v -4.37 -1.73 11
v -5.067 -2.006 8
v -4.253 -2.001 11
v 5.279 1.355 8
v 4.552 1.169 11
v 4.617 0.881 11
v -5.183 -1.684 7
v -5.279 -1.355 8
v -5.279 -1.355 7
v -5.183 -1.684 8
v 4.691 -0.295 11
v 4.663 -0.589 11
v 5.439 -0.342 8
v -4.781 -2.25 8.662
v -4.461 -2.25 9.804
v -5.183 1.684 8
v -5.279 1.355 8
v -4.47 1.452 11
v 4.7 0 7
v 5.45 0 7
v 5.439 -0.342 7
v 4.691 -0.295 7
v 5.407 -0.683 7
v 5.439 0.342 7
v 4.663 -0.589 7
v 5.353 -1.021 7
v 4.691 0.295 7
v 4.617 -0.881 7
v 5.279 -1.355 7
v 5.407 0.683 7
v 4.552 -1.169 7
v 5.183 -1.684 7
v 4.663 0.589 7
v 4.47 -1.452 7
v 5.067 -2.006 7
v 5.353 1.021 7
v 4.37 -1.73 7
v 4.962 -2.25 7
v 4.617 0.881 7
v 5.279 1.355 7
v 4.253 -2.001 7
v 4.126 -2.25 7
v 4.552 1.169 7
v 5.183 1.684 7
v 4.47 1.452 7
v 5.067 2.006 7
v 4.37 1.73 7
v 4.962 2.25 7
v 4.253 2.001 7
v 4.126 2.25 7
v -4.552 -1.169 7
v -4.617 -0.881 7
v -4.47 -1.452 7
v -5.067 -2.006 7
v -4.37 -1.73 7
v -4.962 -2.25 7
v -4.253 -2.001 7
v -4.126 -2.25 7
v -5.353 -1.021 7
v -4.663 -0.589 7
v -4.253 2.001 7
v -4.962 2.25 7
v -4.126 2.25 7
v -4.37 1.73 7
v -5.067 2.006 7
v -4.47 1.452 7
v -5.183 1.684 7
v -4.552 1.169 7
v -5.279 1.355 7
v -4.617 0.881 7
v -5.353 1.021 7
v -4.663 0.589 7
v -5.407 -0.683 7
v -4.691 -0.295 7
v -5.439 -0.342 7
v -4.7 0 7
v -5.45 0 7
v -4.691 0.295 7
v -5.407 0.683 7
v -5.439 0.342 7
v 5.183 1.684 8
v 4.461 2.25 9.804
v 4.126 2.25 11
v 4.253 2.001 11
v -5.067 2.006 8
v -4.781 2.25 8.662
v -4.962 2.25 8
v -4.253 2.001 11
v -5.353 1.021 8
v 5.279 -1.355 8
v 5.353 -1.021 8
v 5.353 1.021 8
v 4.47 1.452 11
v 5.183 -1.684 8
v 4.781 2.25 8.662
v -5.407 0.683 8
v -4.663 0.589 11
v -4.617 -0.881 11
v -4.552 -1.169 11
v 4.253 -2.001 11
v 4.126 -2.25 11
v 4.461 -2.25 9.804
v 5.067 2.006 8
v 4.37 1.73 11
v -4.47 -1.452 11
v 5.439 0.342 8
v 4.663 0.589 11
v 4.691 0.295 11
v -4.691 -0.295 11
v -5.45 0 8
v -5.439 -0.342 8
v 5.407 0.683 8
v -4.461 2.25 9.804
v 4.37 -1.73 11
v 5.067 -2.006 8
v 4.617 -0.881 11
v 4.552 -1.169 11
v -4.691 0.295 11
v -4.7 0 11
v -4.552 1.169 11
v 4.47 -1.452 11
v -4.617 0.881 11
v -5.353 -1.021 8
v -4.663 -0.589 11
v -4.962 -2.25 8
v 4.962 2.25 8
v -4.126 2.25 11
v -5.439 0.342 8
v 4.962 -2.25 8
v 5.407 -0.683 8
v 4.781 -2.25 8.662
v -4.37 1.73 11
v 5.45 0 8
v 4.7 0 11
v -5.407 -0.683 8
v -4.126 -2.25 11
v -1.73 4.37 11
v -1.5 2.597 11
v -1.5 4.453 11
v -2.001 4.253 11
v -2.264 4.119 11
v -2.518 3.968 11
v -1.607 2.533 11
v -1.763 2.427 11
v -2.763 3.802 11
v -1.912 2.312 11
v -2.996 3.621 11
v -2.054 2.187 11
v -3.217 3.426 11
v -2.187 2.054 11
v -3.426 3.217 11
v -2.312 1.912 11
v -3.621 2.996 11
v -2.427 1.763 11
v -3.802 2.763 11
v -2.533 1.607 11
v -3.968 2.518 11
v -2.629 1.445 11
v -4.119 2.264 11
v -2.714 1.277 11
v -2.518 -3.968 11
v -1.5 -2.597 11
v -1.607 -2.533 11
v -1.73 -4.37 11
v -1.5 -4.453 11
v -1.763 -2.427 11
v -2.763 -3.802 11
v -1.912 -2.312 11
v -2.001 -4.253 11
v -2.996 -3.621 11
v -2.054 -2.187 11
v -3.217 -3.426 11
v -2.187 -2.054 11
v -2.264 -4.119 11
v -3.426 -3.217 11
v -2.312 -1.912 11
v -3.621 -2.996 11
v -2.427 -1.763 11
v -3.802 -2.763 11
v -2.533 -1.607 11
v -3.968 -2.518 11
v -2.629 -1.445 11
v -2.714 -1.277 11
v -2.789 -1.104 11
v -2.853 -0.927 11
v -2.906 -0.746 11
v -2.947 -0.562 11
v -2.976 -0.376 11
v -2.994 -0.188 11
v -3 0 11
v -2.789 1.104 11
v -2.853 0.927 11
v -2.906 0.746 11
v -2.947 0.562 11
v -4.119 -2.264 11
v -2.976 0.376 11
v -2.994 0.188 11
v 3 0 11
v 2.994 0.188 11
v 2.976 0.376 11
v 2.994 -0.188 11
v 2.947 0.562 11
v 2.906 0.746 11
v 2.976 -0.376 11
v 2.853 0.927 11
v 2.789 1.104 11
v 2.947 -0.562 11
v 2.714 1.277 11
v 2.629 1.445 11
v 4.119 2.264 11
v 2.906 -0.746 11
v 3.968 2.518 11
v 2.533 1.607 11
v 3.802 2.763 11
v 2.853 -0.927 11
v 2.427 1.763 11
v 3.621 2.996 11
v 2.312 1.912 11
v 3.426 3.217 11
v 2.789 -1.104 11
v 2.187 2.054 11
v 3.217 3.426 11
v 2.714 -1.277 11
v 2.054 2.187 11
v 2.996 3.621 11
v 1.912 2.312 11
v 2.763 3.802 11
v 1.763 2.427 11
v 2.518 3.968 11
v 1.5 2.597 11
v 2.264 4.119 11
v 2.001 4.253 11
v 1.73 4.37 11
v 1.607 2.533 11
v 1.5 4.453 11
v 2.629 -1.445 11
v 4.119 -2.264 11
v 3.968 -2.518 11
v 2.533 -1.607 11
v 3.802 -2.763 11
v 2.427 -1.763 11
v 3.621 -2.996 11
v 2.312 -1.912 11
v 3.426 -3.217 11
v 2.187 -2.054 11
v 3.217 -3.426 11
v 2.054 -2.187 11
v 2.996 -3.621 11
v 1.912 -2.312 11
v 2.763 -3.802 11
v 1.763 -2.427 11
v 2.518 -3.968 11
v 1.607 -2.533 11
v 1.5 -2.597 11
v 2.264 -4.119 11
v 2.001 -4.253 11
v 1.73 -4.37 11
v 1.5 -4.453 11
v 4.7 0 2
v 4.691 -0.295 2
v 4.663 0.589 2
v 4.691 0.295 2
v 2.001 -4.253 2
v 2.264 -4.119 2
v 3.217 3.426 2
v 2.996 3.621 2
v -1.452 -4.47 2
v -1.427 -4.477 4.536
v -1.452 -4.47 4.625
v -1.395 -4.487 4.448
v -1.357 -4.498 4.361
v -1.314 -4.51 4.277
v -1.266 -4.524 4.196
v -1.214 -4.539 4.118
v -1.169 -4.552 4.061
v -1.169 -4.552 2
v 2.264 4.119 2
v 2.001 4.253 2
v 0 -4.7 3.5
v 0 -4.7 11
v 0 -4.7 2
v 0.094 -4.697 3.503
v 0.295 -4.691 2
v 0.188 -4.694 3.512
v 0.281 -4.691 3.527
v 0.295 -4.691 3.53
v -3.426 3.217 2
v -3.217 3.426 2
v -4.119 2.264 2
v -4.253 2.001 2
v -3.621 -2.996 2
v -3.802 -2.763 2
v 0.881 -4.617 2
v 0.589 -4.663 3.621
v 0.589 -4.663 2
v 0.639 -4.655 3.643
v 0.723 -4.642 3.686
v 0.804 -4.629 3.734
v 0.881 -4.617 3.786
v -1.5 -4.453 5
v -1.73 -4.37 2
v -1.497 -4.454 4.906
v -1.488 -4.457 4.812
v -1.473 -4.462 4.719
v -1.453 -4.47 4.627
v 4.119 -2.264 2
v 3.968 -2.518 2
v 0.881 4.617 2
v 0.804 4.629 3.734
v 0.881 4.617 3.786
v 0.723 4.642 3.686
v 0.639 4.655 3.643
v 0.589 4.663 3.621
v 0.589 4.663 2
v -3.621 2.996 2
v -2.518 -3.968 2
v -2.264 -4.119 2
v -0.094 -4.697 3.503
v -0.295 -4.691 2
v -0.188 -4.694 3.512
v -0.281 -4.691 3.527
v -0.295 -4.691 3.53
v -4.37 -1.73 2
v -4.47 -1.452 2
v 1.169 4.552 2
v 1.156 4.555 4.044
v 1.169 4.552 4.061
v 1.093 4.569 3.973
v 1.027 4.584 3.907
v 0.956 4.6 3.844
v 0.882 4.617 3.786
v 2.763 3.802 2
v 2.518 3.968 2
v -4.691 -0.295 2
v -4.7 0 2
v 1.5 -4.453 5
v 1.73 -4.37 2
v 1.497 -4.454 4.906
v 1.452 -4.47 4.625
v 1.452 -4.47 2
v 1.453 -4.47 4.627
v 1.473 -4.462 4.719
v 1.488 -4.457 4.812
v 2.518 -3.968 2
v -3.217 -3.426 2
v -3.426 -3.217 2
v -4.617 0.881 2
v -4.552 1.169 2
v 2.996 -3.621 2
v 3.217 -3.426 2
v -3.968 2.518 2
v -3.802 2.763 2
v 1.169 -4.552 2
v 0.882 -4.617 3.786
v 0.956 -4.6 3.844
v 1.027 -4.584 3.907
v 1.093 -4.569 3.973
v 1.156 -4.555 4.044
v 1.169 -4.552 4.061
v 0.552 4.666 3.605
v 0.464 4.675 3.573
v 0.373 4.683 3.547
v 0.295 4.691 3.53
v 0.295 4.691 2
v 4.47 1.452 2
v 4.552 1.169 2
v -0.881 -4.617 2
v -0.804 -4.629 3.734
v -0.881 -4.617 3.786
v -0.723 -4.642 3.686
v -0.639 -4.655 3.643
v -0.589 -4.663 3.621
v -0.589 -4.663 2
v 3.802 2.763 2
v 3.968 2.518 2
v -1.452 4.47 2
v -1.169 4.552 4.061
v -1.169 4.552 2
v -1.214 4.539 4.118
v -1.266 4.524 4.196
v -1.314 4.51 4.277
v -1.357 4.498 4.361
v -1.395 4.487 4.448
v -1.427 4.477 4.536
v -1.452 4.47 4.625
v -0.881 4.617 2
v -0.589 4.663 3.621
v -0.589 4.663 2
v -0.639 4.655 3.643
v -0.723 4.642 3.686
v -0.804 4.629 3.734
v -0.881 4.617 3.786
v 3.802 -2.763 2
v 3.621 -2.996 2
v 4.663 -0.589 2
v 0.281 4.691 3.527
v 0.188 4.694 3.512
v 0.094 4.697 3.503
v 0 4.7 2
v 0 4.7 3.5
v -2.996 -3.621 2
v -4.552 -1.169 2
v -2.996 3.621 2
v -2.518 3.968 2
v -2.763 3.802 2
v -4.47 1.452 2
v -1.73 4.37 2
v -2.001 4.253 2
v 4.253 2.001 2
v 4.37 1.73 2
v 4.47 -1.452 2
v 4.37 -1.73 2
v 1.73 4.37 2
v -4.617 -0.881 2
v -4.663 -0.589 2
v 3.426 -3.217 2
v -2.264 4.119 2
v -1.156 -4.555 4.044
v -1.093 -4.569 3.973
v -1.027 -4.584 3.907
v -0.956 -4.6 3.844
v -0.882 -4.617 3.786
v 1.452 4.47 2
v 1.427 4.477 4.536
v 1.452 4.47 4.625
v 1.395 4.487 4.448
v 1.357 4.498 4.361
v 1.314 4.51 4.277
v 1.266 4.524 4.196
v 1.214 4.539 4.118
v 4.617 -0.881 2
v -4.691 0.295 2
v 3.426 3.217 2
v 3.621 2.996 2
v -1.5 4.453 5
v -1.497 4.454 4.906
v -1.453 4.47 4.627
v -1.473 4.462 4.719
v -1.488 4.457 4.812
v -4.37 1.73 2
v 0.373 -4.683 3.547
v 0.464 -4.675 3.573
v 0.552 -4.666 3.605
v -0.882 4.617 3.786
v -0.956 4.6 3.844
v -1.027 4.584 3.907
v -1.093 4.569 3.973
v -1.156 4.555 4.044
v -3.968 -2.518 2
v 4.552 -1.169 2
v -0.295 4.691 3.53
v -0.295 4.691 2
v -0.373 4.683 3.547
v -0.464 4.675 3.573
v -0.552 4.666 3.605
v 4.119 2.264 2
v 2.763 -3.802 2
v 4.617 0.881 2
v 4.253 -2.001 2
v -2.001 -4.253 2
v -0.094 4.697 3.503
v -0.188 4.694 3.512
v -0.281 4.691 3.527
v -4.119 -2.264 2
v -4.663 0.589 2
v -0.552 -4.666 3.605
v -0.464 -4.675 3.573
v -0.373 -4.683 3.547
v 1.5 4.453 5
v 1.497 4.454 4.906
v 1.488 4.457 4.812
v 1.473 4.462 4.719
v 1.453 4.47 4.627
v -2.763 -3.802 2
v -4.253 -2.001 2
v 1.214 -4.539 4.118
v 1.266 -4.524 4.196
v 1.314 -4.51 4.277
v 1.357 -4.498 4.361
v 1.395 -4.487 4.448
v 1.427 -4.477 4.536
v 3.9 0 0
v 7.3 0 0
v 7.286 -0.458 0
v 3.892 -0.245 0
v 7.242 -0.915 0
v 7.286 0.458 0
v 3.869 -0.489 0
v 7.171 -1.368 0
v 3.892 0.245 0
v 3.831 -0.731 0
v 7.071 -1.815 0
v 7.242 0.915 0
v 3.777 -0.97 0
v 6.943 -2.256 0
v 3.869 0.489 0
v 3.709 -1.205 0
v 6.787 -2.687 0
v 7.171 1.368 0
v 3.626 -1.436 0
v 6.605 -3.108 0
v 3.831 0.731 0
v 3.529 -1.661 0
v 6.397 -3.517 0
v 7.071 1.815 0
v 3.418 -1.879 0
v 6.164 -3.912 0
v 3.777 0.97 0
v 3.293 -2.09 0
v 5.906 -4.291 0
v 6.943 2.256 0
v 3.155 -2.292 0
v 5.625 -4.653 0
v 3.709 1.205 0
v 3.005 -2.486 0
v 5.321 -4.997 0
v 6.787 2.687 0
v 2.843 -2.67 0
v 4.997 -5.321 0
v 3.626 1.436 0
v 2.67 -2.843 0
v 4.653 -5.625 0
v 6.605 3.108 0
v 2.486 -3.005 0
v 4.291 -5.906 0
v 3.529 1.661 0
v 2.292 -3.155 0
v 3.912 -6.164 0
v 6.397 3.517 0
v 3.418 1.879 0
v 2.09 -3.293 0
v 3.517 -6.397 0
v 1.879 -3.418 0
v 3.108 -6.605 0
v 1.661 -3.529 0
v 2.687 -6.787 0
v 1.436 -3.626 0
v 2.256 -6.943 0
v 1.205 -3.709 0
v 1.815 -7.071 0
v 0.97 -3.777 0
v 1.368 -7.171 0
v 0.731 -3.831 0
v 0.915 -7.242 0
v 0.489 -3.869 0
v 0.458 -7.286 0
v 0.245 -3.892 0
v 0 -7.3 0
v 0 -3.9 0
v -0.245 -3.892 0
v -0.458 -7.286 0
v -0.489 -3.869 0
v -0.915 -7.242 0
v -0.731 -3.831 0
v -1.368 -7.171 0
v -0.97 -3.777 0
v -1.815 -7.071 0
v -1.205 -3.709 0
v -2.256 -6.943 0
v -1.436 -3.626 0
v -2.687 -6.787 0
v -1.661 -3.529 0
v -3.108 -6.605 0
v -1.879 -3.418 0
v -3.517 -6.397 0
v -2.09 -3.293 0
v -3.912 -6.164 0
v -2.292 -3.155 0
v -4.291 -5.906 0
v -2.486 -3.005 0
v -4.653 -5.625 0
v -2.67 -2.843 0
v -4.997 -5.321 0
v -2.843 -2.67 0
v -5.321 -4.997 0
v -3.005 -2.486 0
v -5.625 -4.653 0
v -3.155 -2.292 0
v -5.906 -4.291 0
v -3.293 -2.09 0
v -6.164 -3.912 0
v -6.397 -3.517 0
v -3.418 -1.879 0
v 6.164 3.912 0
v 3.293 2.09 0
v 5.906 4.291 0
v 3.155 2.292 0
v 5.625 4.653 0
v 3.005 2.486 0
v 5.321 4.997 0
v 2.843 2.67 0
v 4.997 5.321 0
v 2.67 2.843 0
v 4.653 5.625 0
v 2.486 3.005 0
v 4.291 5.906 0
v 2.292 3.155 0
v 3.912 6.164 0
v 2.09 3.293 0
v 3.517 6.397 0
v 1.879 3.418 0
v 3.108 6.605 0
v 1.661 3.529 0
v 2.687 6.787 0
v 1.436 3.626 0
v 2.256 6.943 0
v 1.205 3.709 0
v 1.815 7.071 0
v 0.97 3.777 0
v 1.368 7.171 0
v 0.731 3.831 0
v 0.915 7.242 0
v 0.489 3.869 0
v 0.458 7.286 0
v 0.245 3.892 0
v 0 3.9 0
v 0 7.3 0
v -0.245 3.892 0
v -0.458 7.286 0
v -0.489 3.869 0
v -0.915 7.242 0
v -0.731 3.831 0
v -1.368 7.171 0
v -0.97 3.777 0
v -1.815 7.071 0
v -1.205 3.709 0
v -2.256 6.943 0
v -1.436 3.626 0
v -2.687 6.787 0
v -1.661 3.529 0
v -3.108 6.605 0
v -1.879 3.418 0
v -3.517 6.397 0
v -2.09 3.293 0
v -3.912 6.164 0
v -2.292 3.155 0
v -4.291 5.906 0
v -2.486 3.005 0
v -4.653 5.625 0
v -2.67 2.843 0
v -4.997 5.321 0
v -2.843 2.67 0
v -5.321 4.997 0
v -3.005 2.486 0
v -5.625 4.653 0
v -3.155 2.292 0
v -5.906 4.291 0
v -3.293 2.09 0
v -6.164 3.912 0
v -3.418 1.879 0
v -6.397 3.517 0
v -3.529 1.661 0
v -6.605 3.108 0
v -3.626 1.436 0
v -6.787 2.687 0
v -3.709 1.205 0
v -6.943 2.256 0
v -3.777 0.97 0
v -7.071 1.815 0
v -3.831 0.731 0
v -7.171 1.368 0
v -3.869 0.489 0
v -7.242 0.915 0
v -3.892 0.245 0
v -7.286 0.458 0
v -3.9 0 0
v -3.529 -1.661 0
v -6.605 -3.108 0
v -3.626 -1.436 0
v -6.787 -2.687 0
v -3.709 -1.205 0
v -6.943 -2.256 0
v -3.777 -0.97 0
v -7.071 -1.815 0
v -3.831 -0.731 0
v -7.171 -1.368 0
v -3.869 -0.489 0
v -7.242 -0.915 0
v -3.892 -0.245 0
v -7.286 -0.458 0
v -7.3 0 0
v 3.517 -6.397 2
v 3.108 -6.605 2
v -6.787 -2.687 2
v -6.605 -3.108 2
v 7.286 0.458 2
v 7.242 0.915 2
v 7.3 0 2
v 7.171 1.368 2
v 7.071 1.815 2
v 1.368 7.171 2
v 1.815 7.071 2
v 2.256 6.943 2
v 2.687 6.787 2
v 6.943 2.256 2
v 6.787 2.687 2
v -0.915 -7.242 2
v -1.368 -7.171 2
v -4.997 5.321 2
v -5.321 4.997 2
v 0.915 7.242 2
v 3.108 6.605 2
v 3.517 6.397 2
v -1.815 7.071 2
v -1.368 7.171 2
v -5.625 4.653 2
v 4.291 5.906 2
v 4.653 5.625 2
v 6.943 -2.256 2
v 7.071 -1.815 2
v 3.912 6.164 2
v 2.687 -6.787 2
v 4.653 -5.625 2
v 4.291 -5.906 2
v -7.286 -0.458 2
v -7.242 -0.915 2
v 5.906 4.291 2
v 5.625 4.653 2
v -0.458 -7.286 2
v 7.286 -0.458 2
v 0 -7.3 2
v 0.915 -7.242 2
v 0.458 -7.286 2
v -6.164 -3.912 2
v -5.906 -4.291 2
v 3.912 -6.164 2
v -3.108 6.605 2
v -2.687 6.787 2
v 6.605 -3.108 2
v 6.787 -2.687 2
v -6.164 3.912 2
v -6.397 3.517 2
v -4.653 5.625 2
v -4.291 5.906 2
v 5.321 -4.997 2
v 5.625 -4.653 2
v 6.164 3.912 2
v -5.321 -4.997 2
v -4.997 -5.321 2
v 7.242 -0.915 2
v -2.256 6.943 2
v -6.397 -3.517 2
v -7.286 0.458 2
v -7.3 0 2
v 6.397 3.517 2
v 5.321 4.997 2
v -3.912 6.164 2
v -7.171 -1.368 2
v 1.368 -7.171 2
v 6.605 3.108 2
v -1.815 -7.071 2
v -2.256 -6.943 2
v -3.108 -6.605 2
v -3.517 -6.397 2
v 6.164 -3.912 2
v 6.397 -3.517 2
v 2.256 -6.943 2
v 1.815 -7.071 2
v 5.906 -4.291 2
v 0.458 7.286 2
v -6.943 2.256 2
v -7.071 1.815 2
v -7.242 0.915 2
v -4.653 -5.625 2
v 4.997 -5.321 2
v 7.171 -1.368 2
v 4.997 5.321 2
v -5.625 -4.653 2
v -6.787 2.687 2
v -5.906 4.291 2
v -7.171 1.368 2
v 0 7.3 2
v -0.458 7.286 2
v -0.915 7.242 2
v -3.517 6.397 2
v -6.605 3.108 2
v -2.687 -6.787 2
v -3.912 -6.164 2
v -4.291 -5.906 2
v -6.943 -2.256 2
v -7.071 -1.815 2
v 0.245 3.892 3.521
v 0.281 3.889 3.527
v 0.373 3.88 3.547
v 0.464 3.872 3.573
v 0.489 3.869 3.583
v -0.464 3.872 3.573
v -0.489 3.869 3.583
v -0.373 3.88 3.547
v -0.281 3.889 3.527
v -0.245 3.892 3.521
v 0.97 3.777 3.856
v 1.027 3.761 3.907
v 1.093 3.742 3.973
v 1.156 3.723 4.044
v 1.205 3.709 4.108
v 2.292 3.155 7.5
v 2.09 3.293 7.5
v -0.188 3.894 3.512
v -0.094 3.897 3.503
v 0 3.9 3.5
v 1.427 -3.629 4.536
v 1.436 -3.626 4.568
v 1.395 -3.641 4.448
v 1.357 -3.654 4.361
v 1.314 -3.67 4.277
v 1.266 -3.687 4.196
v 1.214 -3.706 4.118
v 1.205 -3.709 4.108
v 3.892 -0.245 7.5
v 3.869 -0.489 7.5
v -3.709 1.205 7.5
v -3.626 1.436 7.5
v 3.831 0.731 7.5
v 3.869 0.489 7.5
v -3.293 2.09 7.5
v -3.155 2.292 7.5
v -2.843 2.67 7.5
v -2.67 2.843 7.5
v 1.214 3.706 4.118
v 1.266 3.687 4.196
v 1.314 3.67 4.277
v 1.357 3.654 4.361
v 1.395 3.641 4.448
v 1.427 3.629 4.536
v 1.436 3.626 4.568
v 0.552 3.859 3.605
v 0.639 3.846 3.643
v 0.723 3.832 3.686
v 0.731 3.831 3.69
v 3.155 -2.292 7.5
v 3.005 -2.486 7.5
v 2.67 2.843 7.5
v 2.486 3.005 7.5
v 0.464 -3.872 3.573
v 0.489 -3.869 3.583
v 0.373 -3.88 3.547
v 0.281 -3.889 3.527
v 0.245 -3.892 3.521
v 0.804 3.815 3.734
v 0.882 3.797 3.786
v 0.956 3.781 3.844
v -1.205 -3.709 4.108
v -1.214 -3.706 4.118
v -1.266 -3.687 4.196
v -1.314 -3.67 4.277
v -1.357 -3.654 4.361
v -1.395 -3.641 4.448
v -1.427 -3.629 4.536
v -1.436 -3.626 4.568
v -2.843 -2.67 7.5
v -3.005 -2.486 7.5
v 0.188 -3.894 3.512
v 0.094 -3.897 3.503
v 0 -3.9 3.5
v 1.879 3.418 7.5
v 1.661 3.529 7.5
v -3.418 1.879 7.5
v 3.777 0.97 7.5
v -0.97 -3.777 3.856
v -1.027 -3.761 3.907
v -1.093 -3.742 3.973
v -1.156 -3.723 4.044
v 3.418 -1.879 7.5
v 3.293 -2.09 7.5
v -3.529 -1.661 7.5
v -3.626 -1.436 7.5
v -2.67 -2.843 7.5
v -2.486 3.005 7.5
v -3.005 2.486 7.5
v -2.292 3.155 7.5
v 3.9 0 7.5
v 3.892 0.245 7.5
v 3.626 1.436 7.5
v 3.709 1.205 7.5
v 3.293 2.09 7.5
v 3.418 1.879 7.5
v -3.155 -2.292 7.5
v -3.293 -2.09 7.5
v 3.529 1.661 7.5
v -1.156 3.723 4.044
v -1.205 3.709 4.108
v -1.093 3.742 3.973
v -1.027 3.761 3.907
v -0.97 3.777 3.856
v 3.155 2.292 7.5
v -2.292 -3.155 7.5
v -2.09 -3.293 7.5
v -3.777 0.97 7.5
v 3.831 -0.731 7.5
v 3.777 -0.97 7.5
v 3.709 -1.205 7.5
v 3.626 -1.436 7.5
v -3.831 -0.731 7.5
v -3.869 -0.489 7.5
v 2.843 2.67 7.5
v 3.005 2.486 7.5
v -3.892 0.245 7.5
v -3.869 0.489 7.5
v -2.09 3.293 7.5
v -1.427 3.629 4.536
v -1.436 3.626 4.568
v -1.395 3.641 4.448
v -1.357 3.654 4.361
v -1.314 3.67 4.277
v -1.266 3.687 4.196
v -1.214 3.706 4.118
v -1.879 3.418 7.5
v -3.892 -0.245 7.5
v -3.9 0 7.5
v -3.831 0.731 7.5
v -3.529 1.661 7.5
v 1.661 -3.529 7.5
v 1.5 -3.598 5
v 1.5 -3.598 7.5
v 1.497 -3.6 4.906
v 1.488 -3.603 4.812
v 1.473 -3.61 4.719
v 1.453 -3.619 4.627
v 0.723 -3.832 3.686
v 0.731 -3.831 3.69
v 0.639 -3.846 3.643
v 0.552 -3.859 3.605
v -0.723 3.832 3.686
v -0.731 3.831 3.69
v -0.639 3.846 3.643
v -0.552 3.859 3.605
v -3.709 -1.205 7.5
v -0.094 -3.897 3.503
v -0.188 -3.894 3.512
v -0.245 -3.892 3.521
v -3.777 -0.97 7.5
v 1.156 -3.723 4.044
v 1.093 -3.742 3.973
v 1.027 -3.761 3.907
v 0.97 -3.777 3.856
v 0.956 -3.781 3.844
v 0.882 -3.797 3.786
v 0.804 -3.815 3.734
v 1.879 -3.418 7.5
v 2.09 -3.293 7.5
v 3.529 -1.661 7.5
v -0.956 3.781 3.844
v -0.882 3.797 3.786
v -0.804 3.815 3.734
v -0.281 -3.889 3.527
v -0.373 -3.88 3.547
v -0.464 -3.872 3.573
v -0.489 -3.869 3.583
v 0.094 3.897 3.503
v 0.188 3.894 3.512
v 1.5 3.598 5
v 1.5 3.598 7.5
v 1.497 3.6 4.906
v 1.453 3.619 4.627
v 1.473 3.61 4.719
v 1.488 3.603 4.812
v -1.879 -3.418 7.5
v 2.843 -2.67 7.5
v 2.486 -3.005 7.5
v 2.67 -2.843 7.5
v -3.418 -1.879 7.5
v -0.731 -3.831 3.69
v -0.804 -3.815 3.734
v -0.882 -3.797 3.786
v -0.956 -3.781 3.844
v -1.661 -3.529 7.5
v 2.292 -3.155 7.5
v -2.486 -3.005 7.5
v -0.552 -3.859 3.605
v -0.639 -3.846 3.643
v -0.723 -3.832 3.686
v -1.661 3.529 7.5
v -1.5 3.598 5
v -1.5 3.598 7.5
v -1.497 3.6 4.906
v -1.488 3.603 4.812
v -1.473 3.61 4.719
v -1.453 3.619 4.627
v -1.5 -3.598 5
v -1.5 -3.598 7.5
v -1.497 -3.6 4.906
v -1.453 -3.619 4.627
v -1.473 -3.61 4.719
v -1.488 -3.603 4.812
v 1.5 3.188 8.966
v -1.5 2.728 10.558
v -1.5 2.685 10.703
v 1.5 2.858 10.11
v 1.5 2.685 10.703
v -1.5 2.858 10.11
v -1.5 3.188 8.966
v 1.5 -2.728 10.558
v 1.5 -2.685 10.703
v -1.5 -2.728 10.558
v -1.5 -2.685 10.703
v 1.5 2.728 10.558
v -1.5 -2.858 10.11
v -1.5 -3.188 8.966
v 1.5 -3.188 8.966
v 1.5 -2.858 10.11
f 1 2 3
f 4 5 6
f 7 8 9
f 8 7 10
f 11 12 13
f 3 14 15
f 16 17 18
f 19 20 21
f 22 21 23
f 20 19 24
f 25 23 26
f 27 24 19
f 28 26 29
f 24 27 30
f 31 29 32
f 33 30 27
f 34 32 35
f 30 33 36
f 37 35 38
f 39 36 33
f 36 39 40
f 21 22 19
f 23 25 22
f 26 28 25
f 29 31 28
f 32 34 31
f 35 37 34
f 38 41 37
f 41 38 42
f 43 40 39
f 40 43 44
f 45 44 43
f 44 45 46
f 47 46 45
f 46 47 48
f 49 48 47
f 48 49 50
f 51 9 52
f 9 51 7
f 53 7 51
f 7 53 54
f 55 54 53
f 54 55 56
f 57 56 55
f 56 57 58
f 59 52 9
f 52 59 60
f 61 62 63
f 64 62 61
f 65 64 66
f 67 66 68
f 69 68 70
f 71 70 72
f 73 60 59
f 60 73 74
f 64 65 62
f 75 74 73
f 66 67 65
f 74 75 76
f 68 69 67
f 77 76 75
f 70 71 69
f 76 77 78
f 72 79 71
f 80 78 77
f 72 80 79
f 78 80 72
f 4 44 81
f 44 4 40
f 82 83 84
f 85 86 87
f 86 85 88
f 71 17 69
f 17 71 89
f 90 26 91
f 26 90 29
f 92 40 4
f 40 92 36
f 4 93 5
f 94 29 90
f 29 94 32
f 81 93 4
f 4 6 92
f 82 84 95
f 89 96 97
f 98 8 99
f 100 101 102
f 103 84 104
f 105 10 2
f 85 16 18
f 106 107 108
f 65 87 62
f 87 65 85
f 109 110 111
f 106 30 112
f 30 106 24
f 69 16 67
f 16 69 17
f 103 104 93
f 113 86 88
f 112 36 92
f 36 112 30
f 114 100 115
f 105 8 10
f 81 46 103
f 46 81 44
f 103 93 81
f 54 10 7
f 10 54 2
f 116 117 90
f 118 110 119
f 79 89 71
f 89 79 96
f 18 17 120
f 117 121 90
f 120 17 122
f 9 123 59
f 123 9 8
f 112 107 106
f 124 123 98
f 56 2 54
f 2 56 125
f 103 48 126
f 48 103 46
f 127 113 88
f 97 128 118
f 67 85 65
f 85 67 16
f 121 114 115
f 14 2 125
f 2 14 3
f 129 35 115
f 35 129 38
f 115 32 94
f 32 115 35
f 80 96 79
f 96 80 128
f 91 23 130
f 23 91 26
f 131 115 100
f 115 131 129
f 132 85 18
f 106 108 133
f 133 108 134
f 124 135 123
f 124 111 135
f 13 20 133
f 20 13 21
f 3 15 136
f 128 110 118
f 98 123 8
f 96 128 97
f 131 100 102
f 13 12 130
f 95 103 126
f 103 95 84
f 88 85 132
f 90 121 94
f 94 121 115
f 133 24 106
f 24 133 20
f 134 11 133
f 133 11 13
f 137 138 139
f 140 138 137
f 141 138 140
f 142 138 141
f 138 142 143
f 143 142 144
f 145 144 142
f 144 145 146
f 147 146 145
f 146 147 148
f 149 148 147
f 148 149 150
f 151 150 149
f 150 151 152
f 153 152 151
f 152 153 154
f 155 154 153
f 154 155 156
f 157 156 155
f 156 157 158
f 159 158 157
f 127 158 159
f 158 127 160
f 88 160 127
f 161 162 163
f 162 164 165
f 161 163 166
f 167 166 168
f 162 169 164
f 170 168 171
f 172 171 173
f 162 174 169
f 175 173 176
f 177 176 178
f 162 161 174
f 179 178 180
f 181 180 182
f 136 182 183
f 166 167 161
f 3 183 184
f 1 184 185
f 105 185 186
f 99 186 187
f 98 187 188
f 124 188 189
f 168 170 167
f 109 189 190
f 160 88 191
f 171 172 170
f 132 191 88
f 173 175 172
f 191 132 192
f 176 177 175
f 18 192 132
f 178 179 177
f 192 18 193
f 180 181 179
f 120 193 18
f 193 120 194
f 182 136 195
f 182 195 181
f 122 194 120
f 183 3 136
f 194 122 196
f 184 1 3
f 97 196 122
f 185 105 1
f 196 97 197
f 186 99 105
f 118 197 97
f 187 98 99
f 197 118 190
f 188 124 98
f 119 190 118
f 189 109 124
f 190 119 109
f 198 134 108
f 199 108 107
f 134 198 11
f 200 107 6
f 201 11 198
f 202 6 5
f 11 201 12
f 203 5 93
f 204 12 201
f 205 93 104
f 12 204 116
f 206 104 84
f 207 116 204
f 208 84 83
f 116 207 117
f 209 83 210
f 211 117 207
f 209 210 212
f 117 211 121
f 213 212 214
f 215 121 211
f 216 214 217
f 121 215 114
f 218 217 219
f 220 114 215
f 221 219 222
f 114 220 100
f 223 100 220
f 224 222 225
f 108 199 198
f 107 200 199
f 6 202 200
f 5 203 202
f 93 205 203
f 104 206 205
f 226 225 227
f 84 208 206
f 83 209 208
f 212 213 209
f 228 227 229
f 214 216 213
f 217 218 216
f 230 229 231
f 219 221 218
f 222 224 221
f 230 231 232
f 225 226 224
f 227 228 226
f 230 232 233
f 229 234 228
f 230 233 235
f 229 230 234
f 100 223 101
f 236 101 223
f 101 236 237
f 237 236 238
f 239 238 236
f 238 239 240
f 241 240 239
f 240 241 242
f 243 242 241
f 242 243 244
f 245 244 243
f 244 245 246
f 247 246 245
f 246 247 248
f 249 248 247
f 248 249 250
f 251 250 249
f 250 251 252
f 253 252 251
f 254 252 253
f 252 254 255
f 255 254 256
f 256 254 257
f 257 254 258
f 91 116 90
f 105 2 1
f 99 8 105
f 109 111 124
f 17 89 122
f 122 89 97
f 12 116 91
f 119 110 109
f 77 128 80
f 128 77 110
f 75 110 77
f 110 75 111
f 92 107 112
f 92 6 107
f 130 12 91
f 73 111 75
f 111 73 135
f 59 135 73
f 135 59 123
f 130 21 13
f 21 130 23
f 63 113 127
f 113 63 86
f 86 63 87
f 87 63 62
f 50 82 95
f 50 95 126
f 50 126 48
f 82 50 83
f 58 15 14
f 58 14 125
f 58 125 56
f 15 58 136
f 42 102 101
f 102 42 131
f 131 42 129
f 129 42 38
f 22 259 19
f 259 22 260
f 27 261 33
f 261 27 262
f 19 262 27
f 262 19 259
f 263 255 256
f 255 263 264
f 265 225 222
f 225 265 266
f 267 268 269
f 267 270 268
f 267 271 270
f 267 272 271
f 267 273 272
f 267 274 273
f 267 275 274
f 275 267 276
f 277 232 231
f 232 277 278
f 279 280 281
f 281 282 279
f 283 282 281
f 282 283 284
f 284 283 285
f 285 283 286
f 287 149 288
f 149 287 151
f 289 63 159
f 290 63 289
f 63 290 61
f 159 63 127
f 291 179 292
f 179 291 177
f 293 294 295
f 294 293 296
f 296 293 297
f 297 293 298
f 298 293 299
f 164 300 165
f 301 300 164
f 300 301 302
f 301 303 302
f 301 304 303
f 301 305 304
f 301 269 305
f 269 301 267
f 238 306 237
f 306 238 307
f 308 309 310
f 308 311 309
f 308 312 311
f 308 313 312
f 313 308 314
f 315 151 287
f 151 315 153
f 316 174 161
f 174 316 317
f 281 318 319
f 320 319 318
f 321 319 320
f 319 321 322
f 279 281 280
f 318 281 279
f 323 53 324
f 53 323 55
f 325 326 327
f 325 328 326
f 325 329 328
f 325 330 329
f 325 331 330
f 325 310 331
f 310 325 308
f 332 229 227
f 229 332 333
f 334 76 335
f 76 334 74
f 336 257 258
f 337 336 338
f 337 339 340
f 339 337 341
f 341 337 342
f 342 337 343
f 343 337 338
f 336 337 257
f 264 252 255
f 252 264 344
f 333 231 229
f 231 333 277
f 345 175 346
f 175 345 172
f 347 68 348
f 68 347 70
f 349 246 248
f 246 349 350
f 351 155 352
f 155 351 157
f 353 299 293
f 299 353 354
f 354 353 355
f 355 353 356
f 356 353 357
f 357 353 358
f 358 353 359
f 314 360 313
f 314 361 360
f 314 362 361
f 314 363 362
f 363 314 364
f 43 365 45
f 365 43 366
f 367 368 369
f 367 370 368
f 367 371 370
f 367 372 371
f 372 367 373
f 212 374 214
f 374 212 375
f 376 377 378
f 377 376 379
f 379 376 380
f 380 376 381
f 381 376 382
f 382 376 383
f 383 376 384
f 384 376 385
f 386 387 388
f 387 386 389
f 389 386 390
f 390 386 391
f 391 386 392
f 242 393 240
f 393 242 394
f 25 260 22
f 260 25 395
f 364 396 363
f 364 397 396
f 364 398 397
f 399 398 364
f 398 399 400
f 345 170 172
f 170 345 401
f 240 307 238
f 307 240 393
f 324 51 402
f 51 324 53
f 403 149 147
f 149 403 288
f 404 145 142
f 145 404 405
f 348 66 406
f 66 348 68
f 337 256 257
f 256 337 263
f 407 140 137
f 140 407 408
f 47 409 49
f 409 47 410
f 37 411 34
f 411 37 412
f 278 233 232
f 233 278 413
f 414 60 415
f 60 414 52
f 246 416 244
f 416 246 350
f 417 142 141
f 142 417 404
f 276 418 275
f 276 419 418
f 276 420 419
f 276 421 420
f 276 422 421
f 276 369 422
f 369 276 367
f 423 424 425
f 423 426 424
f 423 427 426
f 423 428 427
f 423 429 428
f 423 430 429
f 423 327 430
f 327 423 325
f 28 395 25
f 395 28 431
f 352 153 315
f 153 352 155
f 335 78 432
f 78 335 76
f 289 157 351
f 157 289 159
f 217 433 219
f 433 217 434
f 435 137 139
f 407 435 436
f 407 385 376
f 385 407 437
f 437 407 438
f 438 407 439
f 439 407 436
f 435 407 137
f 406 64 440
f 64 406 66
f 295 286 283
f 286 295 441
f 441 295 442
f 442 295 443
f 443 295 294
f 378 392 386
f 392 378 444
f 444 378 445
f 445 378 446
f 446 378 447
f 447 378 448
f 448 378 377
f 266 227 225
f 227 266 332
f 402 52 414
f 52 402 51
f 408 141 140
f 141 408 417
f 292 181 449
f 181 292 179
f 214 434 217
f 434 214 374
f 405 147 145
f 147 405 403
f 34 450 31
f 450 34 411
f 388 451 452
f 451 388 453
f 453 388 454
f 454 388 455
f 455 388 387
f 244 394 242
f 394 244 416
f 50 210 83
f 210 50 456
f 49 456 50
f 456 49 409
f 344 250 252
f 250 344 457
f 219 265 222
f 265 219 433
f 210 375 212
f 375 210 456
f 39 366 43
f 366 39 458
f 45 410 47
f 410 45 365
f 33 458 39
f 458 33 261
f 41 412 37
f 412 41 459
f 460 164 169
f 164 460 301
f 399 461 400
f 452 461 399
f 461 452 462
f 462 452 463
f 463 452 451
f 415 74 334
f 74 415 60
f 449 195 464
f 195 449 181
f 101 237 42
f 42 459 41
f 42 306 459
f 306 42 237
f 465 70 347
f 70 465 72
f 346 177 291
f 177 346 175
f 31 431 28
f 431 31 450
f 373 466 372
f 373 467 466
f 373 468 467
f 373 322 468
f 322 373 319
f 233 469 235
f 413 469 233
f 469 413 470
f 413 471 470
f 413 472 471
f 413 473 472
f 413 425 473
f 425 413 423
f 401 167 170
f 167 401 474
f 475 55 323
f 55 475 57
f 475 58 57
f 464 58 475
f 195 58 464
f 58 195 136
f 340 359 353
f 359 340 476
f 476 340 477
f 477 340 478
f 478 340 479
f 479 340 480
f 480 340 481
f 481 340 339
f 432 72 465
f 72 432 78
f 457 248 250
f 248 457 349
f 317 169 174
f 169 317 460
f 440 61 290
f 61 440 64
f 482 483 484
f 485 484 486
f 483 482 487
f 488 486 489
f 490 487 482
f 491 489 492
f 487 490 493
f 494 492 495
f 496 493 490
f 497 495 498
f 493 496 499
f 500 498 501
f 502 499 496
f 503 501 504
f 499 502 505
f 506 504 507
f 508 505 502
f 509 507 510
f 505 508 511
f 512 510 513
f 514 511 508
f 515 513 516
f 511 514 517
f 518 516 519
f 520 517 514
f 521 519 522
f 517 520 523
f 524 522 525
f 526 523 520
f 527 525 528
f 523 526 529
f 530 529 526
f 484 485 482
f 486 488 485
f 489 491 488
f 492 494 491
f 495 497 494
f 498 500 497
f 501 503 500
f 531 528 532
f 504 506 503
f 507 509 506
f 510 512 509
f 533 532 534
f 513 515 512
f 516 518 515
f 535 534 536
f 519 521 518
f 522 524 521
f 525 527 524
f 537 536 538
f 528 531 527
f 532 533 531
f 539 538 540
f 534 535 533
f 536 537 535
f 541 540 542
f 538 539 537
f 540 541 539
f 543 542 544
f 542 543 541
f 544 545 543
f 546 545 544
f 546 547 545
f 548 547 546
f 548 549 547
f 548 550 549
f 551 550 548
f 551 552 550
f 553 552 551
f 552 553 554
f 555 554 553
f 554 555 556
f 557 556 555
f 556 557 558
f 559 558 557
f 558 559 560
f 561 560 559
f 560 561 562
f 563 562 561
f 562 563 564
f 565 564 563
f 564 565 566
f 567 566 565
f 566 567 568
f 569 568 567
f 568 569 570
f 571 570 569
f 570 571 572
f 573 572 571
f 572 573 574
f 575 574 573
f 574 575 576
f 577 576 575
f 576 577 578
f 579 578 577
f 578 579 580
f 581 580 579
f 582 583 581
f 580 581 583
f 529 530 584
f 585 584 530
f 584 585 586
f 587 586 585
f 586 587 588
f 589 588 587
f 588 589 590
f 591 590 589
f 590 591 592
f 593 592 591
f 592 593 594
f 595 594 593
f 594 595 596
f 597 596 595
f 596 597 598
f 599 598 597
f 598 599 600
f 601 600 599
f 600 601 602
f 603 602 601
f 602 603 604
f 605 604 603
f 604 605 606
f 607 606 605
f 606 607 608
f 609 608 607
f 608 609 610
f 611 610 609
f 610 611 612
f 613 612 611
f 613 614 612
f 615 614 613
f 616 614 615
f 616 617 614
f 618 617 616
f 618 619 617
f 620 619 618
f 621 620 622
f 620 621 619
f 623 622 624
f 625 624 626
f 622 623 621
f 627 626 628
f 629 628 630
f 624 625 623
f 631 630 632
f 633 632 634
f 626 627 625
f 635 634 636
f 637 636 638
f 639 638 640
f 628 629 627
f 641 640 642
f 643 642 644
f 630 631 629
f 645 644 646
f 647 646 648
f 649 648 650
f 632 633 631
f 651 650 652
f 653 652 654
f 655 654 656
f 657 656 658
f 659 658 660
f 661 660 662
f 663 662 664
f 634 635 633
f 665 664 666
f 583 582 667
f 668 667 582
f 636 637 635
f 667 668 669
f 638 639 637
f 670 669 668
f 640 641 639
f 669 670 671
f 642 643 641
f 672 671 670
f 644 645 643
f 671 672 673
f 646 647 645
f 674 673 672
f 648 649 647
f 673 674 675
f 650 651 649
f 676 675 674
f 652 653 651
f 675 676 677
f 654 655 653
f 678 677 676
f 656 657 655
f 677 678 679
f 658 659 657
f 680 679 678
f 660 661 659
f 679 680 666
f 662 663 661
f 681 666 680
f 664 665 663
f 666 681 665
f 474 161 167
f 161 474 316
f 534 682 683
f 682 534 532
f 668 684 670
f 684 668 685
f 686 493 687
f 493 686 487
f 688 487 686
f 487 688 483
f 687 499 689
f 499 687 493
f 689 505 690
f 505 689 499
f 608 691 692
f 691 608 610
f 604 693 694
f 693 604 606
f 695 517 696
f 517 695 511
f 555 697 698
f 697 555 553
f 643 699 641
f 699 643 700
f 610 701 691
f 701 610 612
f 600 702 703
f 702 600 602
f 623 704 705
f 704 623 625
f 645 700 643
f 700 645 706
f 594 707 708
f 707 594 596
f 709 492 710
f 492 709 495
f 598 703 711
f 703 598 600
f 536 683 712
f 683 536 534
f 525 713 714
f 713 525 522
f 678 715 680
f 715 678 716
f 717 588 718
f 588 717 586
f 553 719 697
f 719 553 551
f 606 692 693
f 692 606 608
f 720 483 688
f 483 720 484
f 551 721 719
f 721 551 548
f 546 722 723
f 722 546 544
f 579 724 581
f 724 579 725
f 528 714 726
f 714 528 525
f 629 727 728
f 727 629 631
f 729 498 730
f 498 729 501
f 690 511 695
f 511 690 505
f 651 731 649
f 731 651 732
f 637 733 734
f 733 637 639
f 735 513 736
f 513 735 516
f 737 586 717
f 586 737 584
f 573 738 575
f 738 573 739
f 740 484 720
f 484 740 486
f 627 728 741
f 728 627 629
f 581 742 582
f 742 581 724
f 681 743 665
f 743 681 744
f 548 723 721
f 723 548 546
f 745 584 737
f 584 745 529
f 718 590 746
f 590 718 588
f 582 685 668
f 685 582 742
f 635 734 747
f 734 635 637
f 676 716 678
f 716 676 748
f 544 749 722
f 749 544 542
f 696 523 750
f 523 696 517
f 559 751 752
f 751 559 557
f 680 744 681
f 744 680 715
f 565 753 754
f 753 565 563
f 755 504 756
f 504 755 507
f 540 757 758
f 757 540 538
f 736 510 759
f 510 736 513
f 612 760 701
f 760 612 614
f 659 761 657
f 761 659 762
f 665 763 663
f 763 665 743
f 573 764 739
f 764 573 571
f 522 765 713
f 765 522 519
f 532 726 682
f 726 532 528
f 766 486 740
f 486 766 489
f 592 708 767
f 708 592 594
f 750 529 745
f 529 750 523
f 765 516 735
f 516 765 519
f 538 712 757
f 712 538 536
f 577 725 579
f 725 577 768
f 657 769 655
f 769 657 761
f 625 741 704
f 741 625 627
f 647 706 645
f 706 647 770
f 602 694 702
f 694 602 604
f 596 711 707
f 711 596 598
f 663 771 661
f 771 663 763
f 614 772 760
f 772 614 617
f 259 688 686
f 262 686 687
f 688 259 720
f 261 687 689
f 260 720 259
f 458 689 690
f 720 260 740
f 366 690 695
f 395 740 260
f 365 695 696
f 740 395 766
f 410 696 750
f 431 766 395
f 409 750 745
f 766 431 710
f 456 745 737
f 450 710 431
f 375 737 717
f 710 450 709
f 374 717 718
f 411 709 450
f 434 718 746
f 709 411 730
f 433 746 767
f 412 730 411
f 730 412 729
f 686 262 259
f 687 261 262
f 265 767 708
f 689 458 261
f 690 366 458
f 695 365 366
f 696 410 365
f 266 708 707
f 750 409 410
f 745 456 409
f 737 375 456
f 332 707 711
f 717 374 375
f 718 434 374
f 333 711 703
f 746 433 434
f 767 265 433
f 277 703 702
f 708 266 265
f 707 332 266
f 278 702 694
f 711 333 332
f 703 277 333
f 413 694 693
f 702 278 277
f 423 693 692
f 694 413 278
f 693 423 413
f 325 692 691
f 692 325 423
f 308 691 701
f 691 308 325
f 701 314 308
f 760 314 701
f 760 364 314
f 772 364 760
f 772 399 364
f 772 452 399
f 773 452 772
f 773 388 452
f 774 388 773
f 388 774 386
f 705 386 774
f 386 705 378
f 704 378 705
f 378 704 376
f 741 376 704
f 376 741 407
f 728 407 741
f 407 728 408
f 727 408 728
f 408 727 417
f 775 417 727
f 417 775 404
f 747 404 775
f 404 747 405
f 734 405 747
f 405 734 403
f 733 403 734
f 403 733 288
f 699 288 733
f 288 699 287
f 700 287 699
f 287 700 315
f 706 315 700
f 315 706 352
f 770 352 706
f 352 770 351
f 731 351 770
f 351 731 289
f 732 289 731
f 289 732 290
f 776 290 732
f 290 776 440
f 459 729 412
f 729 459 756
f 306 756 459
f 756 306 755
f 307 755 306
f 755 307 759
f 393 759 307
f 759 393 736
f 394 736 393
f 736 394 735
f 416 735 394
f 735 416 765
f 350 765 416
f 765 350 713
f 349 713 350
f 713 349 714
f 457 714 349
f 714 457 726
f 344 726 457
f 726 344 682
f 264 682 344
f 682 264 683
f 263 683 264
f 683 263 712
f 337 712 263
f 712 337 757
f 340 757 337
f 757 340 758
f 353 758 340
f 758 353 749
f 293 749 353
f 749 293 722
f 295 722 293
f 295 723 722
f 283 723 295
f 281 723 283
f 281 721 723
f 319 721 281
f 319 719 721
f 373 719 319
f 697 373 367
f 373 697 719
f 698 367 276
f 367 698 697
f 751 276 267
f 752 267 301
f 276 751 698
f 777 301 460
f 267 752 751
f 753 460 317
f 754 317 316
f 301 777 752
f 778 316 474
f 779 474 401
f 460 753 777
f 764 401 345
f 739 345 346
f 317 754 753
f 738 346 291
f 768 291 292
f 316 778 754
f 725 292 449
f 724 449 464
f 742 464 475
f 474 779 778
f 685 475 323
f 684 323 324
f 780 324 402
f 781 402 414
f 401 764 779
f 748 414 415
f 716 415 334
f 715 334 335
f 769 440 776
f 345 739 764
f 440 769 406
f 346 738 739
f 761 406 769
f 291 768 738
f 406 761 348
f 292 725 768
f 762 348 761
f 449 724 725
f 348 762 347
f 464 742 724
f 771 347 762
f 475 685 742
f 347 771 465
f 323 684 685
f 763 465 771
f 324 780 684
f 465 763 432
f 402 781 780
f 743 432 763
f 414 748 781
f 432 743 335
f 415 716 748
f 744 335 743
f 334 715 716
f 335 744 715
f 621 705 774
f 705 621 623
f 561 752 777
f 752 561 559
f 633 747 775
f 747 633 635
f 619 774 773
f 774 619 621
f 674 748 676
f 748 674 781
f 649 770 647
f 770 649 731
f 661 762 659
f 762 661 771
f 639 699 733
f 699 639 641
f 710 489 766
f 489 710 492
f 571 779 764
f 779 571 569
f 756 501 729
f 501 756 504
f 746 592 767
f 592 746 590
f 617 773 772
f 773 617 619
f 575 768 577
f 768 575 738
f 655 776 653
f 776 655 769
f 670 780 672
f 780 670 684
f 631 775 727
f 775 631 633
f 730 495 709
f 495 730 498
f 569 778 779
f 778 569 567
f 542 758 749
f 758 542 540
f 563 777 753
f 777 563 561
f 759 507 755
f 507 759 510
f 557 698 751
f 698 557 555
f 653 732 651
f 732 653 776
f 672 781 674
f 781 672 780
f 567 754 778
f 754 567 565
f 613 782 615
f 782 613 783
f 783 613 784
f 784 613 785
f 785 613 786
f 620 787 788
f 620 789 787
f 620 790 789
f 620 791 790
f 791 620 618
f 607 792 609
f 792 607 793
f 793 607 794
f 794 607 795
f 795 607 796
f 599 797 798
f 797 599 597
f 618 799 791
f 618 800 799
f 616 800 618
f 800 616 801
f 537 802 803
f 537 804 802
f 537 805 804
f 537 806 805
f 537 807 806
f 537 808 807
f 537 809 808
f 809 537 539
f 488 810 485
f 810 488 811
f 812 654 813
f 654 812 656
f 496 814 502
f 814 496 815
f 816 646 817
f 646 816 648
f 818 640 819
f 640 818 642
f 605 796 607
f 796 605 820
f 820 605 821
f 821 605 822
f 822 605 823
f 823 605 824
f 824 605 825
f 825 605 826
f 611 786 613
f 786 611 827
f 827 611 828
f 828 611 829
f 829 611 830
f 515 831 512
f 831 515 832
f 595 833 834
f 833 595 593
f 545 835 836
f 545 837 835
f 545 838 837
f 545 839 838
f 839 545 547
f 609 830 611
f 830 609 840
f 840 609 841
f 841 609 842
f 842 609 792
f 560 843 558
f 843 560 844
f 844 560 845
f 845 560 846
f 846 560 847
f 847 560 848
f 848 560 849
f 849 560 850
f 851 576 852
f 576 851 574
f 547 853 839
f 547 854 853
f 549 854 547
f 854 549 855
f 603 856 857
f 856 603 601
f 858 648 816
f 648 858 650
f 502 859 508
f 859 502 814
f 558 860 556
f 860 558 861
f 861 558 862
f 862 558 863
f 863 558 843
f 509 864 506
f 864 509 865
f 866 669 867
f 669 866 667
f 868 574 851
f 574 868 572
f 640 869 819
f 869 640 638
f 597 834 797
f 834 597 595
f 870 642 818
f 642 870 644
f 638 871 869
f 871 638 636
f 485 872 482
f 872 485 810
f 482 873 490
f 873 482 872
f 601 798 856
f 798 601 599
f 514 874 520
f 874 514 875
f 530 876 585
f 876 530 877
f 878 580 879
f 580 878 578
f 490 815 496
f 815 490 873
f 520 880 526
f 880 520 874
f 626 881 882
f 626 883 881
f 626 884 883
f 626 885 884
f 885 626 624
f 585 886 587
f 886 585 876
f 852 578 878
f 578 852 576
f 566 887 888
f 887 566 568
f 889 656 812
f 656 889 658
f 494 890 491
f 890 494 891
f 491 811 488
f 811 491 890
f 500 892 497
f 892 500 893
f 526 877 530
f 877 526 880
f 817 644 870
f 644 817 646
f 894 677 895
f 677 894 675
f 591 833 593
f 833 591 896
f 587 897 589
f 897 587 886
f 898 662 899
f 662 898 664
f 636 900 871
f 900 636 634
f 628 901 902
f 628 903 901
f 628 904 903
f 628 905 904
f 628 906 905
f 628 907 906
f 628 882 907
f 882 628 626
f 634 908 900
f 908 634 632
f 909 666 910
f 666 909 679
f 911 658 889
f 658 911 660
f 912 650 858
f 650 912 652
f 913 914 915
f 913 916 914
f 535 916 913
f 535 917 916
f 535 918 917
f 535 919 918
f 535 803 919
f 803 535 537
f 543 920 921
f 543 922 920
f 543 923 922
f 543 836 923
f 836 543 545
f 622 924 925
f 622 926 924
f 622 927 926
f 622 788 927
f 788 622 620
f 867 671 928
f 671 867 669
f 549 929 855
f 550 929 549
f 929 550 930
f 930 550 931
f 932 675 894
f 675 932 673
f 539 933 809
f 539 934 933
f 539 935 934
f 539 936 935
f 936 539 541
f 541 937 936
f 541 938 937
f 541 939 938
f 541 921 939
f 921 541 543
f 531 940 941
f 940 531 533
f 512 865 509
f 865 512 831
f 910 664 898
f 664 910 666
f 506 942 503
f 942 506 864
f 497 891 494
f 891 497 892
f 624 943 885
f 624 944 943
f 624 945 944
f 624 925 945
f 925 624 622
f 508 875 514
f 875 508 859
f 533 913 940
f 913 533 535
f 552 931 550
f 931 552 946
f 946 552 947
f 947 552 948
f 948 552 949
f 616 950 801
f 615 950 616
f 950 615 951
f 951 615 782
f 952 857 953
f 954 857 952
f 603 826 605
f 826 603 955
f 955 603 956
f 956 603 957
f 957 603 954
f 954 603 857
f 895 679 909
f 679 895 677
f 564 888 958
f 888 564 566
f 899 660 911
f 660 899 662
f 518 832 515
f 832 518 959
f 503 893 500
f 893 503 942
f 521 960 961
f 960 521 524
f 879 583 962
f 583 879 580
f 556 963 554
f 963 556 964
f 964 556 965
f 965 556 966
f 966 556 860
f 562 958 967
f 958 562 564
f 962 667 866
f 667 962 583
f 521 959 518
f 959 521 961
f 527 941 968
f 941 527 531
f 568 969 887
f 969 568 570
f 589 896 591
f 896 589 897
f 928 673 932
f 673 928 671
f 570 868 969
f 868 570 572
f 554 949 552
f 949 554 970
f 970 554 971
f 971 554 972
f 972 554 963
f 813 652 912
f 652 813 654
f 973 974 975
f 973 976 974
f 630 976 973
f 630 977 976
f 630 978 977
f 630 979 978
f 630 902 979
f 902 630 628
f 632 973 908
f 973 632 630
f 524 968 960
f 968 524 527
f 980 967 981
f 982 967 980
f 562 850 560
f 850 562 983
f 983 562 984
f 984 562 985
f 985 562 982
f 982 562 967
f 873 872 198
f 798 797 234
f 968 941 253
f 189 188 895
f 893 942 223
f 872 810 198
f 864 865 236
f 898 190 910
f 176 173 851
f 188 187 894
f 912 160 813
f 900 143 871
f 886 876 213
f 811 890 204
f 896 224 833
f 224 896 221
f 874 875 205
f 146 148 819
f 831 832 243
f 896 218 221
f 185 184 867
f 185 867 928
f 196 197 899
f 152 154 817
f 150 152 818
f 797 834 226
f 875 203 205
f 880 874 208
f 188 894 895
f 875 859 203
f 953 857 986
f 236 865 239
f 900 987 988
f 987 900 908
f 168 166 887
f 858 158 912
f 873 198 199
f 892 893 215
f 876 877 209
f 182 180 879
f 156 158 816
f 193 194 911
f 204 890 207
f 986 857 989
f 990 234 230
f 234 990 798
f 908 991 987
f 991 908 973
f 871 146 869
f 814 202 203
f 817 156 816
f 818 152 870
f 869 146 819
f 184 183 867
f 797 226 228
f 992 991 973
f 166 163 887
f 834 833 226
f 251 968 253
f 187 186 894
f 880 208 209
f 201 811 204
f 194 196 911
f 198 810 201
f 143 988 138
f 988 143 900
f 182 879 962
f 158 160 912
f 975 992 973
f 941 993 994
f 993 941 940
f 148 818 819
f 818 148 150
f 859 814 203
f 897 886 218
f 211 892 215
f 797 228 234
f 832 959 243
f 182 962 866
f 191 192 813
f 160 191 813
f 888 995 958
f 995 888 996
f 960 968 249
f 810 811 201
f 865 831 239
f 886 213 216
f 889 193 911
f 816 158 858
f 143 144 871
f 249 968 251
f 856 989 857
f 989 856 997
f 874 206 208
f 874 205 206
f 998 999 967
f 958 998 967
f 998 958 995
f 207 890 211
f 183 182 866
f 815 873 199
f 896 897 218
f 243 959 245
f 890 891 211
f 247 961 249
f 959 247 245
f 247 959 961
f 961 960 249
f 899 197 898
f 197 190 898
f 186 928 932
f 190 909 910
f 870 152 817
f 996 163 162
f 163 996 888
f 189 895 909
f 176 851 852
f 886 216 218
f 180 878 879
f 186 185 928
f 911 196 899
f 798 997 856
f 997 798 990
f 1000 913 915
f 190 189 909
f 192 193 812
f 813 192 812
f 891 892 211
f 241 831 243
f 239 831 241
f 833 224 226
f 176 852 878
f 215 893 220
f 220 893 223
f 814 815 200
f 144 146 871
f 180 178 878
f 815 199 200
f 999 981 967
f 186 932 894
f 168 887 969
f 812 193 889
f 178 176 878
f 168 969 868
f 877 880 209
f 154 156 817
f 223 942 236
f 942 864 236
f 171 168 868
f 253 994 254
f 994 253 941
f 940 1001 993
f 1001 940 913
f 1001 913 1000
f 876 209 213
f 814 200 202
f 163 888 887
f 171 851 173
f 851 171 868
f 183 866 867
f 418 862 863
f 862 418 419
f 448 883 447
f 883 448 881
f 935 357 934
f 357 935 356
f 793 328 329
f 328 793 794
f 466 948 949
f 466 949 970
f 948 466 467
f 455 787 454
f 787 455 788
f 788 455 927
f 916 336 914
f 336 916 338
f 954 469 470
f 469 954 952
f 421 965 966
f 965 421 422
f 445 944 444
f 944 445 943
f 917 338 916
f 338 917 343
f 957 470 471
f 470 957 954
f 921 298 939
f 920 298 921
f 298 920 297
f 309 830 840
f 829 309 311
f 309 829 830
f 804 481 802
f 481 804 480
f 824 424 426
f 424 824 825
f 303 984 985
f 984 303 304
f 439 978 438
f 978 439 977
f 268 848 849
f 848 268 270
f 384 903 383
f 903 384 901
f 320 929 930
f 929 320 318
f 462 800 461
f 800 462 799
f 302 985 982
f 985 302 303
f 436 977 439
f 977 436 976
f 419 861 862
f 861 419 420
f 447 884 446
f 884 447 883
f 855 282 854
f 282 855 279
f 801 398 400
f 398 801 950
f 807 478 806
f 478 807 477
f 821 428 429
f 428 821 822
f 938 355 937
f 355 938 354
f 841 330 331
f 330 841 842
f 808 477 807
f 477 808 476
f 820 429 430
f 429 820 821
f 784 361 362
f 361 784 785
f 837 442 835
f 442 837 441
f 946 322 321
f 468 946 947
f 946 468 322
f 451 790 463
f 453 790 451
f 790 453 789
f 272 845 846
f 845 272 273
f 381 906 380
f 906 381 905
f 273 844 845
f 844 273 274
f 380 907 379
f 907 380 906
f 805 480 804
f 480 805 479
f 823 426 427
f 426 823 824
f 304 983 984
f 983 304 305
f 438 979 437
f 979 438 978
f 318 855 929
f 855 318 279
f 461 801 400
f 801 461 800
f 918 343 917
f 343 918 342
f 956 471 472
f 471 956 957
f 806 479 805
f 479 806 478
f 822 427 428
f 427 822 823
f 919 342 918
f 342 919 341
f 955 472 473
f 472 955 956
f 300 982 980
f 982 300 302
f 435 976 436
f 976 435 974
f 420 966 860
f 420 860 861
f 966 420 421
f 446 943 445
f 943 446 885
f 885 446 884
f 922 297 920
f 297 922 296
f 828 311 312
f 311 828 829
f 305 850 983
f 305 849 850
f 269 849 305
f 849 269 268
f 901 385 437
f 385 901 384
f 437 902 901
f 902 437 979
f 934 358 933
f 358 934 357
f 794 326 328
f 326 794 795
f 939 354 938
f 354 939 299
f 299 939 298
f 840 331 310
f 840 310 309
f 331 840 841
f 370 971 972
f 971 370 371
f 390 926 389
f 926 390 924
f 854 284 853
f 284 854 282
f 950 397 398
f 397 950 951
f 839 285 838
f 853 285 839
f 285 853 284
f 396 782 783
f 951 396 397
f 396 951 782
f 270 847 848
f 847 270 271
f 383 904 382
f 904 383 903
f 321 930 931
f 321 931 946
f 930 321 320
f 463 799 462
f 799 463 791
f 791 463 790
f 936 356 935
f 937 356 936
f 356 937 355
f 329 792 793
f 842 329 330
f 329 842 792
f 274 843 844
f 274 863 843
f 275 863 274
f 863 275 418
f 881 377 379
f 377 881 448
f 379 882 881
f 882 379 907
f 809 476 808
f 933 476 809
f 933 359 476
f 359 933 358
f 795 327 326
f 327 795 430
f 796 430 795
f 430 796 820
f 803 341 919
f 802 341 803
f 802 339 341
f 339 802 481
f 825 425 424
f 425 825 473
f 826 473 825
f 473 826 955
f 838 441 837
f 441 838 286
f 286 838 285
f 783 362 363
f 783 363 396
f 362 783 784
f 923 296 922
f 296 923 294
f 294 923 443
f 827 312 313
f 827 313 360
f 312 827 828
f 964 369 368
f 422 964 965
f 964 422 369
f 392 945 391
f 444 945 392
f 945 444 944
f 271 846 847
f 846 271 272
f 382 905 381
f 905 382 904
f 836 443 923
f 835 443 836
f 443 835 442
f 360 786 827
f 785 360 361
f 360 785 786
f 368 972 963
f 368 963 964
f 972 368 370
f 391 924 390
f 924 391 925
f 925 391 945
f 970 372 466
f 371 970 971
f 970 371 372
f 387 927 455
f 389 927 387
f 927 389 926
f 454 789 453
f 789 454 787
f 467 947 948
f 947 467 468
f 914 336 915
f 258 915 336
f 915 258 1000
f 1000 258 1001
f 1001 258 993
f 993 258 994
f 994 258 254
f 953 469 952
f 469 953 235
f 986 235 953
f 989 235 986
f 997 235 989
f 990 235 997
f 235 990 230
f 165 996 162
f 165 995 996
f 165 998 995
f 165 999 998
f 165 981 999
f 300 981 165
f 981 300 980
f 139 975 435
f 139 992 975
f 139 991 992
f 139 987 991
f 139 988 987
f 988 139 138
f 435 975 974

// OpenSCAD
// Dimensions en mm
hauteur_piece = 11;
diametre_socle = 14.6;
epaisseur_socle = 2;
diametre_trou = 7.8;
diametre_trou_sommet = 6;
hauteur_cone = 3.5;
diametre_cylindre = 9.4;
hauteur_encoche = 7.5;
largeur_encoche = 3;
hauteur_clip = 4;
largeur_clip = 4.5;
epaisseur_clip = .75;

$fn=100; //resolution

module clip(){
intersection(){
translate(v=[0,0,hauteur_piece-hauteur_clip]){
hull(){
linear_extrude(height=1){circle(diametre_cylindre/2+epaisseur_clip);}
linear_extrude(height=hauteur_clip){circle(diametre_cylindre/2);}
}
}

translate(v=[0,0,hauteur_piece-hauteur_clip/2]){
cube([diametre_socle,largeur_clip,hauteur_clip], center=true);
}
}
}


module socle(){cylinder(h=epaisseur_socle,r=diametre_socle/2);}

module cylindre_exterieur(){
	cylinder(h=hauteur_piece,r=diametre_cylindre/2);
}

module cylindre_interieur(){
	cylinder(h=hauteur_piece-hauteur_cone,r=diametre_trou/2);
}

module cone_interieur(){
	translate(v=[0,0,hauteur_piece-hauteur_cone]){
		cylinder(h=hauteur_cone,r1=diametre_trou/2,r2=diametre_trou_sommet/2);
	}
}

module creu_interieur(){
	union(){
		cylindre_interieur();
		cone_interieur();
	}
}

module flex(){
	translate(v=[0,diametre_cylindre/2,hauteur_piece-hauteur_encoche+largeur_encoche/2]){
		rotate(a=90, v=[1,0,0]) {
			cylinder(h=diametre_cylindre,r=largeur_encoche/2);
			translate(v=[-largeur_encoche/2,0,0]){
				cube(size = [largeur_encoche,hauteur_encoche-largeur_encoche/2,diametre_cylindre], center=false);
			}
		}
	}
}

module base(){
	difference(){
		union(){
			cylindre_exterieur();
			socle();
			clip();
		}
		creu_interieur();
		flex();
	}
}

base();
